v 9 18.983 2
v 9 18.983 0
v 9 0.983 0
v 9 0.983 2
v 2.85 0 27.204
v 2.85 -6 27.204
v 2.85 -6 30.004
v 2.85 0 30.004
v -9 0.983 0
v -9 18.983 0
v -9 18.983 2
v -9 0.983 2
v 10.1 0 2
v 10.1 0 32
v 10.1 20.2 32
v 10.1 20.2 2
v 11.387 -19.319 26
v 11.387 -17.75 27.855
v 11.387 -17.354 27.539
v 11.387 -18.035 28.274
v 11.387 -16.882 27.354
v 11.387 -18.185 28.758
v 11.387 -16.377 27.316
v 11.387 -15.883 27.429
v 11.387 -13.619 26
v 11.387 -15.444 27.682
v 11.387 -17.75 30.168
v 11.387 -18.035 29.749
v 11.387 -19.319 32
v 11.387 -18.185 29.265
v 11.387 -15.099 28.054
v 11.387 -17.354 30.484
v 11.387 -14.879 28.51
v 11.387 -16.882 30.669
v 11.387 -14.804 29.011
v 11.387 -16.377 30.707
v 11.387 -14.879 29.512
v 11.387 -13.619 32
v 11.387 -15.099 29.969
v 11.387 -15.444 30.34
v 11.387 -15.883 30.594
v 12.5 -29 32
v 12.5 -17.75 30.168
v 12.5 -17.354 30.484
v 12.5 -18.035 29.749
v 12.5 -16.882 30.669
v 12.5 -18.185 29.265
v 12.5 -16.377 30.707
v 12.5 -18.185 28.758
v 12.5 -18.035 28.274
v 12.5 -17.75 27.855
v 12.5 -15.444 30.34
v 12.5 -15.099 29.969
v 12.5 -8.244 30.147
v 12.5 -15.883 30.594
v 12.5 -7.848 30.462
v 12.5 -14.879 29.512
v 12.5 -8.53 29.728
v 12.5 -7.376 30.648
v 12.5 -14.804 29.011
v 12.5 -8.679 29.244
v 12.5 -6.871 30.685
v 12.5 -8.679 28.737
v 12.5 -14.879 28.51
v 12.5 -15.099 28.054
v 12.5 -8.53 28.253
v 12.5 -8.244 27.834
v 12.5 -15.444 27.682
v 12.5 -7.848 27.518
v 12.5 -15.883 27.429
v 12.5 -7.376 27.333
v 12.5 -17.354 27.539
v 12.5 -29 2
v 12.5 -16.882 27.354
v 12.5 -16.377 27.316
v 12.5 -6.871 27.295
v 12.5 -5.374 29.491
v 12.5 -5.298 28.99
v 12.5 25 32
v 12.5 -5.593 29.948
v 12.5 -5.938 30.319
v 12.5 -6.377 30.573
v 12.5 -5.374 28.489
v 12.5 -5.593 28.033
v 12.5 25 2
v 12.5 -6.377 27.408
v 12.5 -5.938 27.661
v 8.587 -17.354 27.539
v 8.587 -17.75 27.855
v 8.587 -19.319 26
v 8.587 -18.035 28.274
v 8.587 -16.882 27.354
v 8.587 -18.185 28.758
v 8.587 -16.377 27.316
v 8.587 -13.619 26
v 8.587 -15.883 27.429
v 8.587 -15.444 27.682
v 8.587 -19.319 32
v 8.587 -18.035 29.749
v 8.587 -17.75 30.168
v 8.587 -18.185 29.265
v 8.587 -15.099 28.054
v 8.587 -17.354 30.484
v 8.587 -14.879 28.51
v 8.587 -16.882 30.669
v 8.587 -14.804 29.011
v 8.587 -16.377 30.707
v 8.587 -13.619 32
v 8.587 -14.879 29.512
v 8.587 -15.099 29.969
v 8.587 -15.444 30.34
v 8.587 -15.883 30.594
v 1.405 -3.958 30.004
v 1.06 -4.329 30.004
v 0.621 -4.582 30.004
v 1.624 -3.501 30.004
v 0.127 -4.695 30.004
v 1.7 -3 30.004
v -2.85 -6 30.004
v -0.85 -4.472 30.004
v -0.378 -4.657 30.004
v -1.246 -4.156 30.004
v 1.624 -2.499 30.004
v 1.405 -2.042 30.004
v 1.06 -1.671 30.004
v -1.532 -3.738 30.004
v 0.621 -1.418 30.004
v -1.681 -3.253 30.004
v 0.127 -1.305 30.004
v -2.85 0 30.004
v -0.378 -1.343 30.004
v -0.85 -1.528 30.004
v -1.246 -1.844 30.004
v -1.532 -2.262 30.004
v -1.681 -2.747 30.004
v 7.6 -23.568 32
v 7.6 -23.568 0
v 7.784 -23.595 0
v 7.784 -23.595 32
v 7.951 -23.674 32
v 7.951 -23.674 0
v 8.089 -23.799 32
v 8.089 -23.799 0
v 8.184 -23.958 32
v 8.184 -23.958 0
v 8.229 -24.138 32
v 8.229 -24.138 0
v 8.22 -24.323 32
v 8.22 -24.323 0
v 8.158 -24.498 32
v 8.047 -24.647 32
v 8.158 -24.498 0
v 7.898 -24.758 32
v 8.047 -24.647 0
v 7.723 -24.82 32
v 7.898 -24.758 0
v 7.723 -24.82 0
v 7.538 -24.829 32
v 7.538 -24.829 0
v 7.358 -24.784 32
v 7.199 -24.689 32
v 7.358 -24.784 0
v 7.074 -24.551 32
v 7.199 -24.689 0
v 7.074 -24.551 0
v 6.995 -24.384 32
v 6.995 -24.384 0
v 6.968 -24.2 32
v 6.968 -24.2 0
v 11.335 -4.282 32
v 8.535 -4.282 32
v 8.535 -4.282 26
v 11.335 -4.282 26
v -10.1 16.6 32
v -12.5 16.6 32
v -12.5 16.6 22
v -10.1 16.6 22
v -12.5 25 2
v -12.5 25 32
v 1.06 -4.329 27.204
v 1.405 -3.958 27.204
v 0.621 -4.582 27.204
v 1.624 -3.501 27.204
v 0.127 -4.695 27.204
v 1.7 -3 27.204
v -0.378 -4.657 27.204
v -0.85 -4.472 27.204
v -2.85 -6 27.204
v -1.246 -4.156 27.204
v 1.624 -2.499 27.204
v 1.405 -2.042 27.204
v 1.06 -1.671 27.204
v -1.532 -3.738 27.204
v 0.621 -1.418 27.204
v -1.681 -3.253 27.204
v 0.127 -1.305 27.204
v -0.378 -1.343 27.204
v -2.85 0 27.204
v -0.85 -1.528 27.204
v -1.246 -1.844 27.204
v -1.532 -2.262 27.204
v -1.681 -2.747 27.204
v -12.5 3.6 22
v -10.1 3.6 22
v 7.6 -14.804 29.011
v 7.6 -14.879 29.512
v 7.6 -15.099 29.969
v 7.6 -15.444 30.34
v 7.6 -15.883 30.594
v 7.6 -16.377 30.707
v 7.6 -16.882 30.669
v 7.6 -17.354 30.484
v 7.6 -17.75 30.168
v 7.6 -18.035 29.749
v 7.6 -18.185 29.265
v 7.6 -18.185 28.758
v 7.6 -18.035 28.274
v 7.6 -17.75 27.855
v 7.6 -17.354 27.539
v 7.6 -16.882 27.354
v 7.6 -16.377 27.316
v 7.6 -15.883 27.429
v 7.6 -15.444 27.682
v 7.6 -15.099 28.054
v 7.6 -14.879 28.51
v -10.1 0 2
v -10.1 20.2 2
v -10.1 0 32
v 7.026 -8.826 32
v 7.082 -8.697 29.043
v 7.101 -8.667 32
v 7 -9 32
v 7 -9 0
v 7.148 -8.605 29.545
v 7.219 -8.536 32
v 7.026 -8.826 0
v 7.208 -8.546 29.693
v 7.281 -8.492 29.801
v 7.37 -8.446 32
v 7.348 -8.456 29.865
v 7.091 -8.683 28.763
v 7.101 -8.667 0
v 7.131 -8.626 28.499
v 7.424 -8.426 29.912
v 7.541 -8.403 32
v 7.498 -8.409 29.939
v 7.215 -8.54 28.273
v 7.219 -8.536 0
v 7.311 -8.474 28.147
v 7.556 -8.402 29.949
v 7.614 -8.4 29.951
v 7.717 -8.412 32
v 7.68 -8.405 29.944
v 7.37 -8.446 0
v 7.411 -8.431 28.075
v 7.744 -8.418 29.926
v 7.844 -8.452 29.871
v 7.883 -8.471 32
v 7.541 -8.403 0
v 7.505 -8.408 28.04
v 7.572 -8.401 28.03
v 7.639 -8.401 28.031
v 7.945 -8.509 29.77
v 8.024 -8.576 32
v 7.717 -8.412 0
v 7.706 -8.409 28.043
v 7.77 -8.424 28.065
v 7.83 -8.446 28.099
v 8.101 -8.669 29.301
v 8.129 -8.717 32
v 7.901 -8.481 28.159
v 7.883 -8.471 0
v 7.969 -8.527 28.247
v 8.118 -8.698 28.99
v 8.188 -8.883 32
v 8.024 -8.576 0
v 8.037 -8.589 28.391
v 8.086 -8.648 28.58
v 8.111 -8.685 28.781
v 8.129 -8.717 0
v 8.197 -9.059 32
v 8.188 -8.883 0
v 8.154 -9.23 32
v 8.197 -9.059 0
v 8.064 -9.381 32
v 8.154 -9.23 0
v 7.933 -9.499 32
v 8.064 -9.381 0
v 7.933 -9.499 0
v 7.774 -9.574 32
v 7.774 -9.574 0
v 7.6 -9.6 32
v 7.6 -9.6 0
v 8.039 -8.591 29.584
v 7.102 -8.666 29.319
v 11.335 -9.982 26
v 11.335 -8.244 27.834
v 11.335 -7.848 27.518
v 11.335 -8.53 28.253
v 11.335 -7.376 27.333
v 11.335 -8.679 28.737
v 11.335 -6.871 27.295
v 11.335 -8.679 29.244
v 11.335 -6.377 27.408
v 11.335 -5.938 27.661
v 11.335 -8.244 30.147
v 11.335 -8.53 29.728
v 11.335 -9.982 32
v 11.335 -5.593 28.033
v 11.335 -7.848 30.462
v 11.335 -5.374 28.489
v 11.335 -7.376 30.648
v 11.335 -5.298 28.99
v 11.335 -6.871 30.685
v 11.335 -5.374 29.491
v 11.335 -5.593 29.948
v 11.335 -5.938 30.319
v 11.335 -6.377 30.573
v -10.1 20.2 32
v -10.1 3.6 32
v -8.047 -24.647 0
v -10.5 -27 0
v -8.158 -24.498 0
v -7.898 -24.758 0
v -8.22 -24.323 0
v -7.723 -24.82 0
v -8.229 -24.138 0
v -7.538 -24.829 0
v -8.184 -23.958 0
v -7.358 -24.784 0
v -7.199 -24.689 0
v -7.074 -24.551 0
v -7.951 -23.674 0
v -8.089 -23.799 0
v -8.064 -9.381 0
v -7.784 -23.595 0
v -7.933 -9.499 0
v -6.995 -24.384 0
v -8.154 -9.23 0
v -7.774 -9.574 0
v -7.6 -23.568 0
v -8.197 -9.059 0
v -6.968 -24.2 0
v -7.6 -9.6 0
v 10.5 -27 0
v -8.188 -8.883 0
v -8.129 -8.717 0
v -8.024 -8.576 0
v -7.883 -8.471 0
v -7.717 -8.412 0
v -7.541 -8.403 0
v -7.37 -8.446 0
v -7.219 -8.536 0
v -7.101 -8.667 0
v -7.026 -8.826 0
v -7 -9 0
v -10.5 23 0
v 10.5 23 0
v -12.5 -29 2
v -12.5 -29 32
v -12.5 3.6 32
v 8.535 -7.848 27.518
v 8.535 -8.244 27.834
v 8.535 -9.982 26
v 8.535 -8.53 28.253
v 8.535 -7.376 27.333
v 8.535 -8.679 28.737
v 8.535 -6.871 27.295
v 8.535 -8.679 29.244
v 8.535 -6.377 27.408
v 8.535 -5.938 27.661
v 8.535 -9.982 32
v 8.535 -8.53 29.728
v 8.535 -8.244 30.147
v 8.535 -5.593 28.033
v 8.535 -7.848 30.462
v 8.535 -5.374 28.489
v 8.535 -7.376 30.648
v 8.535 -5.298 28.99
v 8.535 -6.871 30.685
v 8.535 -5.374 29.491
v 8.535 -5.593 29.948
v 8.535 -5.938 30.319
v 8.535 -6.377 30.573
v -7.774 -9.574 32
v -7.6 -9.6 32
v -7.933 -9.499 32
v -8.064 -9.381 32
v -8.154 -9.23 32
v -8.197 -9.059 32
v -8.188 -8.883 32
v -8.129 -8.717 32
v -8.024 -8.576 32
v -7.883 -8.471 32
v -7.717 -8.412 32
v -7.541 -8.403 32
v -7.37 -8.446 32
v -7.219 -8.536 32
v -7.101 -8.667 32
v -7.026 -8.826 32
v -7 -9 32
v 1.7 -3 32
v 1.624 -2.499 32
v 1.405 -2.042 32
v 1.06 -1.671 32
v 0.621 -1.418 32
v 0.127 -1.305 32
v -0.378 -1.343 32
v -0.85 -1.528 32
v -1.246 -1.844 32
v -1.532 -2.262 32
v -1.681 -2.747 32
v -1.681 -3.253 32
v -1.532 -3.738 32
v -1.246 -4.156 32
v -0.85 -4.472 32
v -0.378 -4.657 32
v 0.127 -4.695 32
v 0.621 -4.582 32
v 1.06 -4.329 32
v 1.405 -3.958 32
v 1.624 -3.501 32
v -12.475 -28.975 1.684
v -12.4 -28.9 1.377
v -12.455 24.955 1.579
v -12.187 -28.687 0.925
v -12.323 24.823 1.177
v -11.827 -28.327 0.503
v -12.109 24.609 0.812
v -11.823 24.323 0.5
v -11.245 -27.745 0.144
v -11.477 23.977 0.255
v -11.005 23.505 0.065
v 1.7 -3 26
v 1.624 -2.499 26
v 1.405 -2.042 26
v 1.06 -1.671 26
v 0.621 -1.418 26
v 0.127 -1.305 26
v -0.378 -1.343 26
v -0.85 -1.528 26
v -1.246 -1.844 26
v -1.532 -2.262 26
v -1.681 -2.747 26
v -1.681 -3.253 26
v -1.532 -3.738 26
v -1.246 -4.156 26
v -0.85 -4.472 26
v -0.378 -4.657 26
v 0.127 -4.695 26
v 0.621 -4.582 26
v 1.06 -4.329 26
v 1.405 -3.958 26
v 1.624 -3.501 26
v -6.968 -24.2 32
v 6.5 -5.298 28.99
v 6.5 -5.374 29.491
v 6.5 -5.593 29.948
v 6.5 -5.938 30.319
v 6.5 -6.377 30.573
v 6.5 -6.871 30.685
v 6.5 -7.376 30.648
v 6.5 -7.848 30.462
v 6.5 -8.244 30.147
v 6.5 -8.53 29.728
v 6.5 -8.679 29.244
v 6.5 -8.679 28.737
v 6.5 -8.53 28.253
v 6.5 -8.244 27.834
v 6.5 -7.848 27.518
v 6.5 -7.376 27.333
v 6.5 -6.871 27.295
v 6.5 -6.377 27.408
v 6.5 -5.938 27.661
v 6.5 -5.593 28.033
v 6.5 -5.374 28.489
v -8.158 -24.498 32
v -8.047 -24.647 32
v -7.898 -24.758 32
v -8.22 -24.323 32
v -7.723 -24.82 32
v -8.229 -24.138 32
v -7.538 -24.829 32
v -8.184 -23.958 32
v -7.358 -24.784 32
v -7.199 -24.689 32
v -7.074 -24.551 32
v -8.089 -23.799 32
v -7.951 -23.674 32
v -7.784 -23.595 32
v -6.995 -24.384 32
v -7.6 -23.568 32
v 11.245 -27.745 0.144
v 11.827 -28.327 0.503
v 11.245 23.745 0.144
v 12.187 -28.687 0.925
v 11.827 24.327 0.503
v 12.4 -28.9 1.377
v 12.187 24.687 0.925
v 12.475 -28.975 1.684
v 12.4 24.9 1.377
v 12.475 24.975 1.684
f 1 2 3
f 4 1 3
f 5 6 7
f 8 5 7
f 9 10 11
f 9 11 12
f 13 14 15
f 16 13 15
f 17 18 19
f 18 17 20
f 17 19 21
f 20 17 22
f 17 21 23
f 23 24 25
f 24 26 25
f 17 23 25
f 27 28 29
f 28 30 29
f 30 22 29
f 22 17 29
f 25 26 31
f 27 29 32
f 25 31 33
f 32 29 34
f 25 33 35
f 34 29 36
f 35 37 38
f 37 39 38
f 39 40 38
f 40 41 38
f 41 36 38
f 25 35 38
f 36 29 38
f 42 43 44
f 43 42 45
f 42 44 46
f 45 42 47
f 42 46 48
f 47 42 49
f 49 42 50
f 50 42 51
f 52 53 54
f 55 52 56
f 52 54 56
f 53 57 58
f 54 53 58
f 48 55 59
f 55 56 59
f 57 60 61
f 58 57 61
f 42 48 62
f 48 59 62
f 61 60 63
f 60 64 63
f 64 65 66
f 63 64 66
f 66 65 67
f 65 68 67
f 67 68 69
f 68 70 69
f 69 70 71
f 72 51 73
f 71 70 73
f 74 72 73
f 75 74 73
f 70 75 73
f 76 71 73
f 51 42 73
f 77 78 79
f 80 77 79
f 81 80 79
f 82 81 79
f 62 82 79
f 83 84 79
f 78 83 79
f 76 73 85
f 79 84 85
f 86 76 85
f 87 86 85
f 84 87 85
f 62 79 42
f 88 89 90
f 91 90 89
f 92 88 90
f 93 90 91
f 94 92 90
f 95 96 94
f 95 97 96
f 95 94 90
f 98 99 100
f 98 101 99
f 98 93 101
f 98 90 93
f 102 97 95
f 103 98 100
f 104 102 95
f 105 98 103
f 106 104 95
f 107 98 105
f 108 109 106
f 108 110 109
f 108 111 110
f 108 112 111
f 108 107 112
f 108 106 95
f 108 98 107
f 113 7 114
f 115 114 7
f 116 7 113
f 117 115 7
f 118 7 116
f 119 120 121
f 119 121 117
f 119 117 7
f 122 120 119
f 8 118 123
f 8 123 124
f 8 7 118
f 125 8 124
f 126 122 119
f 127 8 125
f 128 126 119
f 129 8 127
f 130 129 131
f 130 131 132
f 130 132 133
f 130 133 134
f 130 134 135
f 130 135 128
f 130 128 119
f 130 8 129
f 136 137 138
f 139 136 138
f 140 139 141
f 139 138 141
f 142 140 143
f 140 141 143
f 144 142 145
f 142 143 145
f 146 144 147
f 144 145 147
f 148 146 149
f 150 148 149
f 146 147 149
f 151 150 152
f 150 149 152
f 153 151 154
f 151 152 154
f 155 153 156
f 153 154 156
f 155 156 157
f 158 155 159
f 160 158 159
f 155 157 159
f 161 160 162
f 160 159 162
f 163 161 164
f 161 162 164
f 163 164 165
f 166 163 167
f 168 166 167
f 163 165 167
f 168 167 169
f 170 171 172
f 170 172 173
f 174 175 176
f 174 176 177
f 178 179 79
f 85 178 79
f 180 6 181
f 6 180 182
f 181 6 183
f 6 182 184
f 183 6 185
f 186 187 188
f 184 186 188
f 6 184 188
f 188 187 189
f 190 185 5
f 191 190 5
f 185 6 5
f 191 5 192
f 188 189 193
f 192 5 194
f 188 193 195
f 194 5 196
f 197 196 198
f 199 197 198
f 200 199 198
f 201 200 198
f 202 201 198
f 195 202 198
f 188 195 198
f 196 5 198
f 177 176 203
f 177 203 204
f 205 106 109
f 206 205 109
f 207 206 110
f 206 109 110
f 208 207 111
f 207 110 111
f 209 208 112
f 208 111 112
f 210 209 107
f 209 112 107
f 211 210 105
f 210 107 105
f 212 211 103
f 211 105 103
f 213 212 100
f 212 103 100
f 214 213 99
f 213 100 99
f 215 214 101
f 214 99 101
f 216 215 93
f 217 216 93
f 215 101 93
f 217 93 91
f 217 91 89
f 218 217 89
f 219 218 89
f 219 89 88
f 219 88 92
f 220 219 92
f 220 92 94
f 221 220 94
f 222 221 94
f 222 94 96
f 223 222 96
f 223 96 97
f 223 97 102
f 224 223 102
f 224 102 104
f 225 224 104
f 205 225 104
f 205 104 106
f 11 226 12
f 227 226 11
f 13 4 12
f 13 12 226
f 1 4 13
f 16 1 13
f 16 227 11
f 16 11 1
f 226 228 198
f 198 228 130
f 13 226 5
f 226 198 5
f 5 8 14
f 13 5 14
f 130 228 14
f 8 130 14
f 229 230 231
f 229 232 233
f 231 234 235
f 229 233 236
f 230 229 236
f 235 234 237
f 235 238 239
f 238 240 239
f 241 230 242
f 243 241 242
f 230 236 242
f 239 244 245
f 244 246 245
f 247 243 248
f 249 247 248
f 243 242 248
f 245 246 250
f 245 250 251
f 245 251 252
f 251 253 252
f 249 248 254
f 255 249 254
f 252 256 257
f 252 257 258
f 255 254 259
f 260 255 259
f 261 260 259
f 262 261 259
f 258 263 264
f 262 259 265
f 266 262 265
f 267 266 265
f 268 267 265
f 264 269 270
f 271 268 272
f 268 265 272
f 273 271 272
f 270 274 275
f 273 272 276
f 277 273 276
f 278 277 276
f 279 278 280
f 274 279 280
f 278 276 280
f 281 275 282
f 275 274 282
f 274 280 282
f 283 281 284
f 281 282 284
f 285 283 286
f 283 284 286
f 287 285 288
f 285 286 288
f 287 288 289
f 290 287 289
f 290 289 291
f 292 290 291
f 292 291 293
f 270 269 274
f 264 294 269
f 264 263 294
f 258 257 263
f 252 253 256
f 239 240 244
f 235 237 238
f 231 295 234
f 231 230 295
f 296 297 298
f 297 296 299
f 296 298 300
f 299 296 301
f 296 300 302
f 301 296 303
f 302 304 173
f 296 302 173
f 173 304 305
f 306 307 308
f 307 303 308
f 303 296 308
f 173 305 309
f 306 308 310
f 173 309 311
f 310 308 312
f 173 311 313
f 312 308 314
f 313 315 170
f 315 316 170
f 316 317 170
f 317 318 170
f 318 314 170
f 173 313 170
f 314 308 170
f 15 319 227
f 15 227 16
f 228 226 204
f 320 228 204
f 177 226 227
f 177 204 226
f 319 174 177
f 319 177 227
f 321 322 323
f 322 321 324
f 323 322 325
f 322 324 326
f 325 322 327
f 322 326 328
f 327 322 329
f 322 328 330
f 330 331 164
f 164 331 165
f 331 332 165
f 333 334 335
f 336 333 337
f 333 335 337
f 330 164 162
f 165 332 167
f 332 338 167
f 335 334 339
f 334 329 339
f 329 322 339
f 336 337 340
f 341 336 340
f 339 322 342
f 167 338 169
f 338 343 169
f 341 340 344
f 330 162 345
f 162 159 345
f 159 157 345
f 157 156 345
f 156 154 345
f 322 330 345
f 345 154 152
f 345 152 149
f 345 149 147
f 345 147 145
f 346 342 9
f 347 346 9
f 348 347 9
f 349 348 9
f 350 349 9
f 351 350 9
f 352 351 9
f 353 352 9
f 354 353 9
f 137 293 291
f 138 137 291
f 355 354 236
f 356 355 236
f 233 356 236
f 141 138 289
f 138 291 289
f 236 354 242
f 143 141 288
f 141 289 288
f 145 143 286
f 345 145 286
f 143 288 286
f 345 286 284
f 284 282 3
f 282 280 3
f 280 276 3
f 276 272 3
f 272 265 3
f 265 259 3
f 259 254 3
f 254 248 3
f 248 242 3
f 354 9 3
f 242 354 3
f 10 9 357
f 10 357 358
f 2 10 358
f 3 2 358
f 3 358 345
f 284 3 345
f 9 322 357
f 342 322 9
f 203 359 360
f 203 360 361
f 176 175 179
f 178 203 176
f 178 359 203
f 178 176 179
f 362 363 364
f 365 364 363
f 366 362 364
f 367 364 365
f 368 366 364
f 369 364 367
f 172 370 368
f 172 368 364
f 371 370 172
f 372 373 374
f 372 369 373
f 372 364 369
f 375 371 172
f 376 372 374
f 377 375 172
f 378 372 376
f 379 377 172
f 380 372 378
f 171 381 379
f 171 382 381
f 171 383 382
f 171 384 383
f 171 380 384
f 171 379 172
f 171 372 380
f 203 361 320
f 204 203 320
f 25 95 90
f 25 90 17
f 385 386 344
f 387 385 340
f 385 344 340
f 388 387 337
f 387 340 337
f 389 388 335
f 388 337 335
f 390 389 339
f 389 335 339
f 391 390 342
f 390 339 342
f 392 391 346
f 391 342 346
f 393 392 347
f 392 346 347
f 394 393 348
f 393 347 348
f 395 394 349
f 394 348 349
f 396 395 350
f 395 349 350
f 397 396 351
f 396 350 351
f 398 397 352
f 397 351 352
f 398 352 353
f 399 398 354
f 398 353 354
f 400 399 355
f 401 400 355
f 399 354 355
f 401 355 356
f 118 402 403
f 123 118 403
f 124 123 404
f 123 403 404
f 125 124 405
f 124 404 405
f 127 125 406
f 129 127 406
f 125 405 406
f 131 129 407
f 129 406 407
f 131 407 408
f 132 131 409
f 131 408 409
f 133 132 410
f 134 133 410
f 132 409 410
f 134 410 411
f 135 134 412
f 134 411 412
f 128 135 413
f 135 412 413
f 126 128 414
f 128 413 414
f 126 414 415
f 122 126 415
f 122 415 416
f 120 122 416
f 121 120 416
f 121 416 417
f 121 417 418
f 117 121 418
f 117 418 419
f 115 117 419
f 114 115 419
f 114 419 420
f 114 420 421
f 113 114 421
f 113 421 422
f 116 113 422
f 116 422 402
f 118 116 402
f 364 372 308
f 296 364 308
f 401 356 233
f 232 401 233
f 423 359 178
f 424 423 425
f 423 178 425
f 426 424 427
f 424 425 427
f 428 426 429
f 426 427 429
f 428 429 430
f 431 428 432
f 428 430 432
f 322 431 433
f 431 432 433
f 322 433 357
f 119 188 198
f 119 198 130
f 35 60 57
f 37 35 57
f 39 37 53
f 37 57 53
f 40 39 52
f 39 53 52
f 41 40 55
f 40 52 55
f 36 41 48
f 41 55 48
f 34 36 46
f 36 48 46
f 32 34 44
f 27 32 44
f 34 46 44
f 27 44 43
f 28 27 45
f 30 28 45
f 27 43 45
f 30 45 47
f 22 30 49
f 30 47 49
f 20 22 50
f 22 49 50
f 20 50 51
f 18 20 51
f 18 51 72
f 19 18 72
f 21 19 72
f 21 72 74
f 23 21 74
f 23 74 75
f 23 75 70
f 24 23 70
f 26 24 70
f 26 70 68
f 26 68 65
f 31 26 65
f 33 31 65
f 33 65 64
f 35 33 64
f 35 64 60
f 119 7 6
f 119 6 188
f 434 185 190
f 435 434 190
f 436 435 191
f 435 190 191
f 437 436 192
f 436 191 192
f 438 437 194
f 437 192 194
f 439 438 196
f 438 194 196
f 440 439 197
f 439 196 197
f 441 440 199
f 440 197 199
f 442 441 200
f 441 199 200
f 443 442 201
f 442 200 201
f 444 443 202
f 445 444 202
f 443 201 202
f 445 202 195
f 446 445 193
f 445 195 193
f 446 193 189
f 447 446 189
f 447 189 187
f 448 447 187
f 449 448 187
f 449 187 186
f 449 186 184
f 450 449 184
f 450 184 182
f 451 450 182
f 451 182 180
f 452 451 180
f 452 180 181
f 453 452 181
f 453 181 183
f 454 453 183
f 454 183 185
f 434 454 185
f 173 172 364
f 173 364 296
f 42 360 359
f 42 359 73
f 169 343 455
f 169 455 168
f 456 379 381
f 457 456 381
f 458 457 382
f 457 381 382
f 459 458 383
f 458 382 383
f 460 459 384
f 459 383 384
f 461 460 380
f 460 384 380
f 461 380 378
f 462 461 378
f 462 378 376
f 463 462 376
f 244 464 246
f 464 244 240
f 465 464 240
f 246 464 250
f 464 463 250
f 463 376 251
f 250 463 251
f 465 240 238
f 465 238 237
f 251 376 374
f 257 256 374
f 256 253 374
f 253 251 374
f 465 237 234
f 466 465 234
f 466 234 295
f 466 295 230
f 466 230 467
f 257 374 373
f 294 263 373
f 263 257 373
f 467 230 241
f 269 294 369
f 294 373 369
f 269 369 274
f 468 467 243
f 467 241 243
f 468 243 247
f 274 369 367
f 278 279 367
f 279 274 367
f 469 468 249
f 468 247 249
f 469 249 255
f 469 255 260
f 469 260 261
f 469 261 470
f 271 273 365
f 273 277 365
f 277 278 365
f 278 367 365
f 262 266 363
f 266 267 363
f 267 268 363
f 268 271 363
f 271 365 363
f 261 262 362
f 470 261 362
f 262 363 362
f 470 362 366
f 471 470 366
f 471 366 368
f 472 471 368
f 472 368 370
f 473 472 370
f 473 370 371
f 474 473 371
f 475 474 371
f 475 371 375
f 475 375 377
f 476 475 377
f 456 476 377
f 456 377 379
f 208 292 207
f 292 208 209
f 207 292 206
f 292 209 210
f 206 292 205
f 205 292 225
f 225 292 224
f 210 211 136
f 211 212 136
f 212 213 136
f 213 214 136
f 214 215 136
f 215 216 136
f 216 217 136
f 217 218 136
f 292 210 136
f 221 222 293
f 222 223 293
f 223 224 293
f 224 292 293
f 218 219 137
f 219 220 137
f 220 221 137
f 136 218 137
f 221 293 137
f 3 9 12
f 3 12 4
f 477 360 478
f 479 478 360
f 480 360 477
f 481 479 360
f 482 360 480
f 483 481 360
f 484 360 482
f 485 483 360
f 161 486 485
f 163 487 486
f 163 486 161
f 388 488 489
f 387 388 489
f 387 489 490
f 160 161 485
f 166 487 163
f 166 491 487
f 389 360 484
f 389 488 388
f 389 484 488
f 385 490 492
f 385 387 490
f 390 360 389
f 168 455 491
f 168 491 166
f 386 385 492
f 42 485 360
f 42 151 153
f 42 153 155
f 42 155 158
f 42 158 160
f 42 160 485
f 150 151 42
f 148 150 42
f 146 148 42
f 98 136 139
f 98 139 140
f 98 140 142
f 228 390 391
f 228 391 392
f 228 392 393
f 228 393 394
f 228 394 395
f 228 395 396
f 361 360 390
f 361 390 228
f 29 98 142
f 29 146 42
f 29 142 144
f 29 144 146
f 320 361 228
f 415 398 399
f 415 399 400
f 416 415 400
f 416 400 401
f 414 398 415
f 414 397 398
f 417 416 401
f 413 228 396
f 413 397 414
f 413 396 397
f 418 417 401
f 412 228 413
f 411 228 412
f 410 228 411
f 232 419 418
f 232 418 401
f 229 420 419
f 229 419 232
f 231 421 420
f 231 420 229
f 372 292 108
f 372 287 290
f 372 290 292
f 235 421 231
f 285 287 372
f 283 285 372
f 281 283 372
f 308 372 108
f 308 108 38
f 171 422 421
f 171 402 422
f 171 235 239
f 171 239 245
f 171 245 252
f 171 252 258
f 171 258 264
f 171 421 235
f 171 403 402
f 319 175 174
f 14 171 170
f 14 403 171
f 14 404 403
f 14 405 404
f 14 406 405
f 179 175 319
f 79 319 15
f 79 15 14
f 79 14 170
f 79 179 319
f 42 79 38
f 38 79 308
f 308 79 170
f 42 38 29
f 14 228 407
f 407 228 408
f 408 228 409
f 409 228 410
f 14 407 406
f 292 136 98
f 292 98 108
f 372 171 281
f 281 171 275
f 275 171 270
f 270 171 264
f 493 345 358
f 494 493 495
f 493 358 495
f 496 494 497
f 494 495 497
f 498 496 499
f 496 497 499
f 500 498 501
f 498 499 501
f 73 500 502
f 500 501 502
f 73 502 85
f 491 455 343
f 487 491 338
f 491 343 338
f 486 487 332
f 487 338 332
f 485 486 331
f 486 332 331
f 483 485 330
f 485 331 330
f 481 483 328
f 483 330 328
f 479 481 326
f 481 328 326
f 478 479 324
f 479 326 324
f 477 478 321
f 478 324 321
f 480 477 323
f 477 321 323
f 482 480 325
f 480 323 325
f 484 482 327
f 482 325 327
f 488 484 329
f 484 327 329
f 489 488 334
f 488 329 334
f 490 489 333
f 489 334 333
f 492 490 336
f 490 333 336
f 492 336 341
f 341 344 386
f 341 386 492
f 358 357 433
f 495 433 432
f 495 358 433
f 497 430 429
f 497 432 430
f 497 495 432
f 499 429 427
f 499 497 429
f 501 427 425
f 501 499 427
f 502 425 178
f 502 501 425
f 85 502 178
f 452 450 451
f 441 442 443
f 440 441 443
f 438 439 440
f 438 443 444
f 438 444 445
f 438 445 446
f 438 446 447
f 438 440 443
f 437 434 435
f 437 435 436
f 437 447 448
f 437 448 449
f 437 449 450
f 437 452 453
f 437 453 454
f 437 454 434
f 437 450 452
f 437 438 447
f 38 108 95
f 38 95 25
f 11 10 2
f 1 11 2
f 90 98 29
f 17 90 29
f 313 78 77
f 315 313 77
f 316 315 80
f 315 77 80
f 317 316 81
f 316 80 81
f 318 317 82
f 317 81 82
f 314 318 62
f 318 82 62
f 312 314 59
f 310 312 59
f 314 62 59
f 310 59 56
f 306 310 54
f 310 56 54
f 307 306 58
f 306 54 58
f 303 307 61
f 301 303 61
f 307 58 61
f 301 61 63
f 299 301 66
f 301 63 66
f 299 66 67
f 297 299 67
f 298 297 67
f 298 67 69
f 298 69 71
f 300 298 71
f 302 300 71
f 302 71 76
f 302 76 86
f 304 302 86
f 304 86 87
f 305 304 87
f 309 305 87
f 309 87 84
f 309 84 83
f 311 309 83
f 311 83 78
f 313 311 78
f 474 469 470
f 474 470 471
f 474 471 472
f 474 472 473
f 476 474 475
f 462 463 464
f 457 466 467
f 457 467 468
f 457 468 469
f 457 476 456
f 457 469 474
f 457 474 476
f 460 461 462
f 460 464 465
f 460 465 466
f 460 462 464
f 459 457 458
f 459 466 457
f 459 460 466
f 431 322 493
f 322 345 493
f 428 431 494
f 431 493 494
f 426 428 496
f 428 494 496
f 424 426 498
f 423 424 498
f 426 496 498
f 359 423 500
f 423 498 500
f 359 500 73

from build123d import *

# Parameters (mm, degrees)
SKETCH_W        = 25
SKETCH_H        = 54
PAD_DEPTH       = 32
SKETCH001_W     = 15.2
SKETCH001_H     = 15.2
SKETCH001_W_2   = 18
SKETCH001_H_2   = 18
POCKET_DEPTH    = 32.001
SKETCH002_W     = 20.2
SKETCH002_H     = 20.2
POCKET001_DEPTH = 30
SKETCH005_W     = 2.8
SKETCH005_H     = 5.7
POCKET002_DEPTH = 6
SKETCH003_R     = 1.7
POCKET003_DEPTH = 6
SKETCH006_W     = 5.7
SKETCH006_H     = 2.8
POCKET004_DEPTH = 6
SKETCH004_R     = 1.7
POCKET005_DEPTH = 6
SKETCH007_W     = 4
SKETCH007_H     = 13
POCKET006_DEPTH = 10
FILLET_R        = 2
SKETCH008_R     = 0.632456
SKETCH008_R_2   = 0.6
POCKET007_DEPTH = 32.001


with BuildPart() as part:
    # Sketch → Pad (new body)
    with BuildSketch(Plane.XY):
        with Locations((0, -2)):
            Rectangle(SKETCH_W, SKETCH_H)
    extrude(amount=PAD_DEPTH)

    # Sketch001 → Pocket (cut, through all)
    with BuildSketch(Plane(origin=(0, 0, 0), x_dir=(1, 0, 0), z_dir=(0, 0, -1))):
        with Locations((0, 16.6)):
            Rectangle(SKETCH001_W, SKETCH001_H)
        with Locations((0, -9.982677)):
            Rectangle(SKETCH001_W_2, SKETCH001_H_2)
    extrude(amount=-POCKET_DEPTH, mode=Mode.SUBTRACT)

    # Sketch002 → Pocket001 (cut)
    with BuildSketch(Plane.XY.offset(32)):
        with Locations((0, 10.1)):
            Rectangle(SKETCH002_W, SKETCH002_H)
    extrude(amount=-POCKET001_DEPTH, mode=Mode.SUBTRACT)

    # Sketch005 → Pocket002 (cut)
    with BuildSketch(Plane.XY.offset(32)):
        with Locations((9.935363, -7.131511)):
            Rectangle(SKETCH005_W, SKETCH005_H)
        with Locations((9.987245, -16.468893)):
            Rectangle(SKETCH005_W, SKETCH005_H)
    extrude(amount=-POCKET002_DEPTH, mode=Mode.SUBTRACT)

    # Sketch003 → Pocket003 (cut)
    with BuildSketch(Plane.YZ.offset(12.5)):
        with Locations((-6.998034, 28.990236)):
            Circle(SKETCH003_R)
        with Locations((-16.503597, 29.011274)):
            Circle(SKETCH003_R)
    extrude(amount=-POCKET003_DEPTH, mode=Mode.SUBTRACT)

    # Sketch006 → Pocket004 (cut)
    with BuildSketch(Plane(origin=(0, 0, 0), x_dir=(-1, 0, 0), z_dir=(0, 1, 0))):
        with Locations((0, 28.604247)):
            Rectangle(SKETCH006_W, SKETCH006_H)
    extrude(amount=-POCKET004_DEPTH, mode=Mode.SUBTRACT)

    # Sketch004 → Pocket005 (cut)
    with BuildSketch(Plane.XY.offset(32)):
        with Locations((0, -3)):
            Circle(SKETCH004_R)
    extrude(amount=-POCKET005_DEPTH, mode=Mode.SUBTRACT)

    # Sketch007 → Pocket006 (cut)
    with BuildSketch(Plane.XY.offset(32)):
        with Locations((-11, 10.1)):
            Rectangle(SKETCH007_W, SKETCH007_H)
    extrude(amount=-POCKET006_DEPTH, mode=Mode.SUBTRACT)

    # Fillet
    fillet_edges = [part.edges().sort_by_distance(p)[0] for p in [
        (12.5, -2, 0),
        (0, -29, 0),
        (-12.5, -2, 0),
        (0, 25, 0),
    ]]
    fillet(fillet_edges, radius=FILLET_R)

    # Sketch008 → Pocket007 (cut, through all)
    with BuildSketch(Plane(origin=(0, 0, 0), x_dir=(1, 0, 0), z_dir=(0, 0, -1))):
        with Locations((-7.6, 24.200001)):
            Circle(SKETCH008_R)
        with Locations((7.6, 24.2)):
            Circle(SKETCH008_R)
        with Locations((7.6, 9)):
            Circle(SKETCH008_R_2)
        with Locations((-7.6, 9)):
            Circle(SKETCH008_R_2)
    extrude(amount=-POCKET007_DEPTH, mode=Mode.SUBTRACT)


solid = part.part
